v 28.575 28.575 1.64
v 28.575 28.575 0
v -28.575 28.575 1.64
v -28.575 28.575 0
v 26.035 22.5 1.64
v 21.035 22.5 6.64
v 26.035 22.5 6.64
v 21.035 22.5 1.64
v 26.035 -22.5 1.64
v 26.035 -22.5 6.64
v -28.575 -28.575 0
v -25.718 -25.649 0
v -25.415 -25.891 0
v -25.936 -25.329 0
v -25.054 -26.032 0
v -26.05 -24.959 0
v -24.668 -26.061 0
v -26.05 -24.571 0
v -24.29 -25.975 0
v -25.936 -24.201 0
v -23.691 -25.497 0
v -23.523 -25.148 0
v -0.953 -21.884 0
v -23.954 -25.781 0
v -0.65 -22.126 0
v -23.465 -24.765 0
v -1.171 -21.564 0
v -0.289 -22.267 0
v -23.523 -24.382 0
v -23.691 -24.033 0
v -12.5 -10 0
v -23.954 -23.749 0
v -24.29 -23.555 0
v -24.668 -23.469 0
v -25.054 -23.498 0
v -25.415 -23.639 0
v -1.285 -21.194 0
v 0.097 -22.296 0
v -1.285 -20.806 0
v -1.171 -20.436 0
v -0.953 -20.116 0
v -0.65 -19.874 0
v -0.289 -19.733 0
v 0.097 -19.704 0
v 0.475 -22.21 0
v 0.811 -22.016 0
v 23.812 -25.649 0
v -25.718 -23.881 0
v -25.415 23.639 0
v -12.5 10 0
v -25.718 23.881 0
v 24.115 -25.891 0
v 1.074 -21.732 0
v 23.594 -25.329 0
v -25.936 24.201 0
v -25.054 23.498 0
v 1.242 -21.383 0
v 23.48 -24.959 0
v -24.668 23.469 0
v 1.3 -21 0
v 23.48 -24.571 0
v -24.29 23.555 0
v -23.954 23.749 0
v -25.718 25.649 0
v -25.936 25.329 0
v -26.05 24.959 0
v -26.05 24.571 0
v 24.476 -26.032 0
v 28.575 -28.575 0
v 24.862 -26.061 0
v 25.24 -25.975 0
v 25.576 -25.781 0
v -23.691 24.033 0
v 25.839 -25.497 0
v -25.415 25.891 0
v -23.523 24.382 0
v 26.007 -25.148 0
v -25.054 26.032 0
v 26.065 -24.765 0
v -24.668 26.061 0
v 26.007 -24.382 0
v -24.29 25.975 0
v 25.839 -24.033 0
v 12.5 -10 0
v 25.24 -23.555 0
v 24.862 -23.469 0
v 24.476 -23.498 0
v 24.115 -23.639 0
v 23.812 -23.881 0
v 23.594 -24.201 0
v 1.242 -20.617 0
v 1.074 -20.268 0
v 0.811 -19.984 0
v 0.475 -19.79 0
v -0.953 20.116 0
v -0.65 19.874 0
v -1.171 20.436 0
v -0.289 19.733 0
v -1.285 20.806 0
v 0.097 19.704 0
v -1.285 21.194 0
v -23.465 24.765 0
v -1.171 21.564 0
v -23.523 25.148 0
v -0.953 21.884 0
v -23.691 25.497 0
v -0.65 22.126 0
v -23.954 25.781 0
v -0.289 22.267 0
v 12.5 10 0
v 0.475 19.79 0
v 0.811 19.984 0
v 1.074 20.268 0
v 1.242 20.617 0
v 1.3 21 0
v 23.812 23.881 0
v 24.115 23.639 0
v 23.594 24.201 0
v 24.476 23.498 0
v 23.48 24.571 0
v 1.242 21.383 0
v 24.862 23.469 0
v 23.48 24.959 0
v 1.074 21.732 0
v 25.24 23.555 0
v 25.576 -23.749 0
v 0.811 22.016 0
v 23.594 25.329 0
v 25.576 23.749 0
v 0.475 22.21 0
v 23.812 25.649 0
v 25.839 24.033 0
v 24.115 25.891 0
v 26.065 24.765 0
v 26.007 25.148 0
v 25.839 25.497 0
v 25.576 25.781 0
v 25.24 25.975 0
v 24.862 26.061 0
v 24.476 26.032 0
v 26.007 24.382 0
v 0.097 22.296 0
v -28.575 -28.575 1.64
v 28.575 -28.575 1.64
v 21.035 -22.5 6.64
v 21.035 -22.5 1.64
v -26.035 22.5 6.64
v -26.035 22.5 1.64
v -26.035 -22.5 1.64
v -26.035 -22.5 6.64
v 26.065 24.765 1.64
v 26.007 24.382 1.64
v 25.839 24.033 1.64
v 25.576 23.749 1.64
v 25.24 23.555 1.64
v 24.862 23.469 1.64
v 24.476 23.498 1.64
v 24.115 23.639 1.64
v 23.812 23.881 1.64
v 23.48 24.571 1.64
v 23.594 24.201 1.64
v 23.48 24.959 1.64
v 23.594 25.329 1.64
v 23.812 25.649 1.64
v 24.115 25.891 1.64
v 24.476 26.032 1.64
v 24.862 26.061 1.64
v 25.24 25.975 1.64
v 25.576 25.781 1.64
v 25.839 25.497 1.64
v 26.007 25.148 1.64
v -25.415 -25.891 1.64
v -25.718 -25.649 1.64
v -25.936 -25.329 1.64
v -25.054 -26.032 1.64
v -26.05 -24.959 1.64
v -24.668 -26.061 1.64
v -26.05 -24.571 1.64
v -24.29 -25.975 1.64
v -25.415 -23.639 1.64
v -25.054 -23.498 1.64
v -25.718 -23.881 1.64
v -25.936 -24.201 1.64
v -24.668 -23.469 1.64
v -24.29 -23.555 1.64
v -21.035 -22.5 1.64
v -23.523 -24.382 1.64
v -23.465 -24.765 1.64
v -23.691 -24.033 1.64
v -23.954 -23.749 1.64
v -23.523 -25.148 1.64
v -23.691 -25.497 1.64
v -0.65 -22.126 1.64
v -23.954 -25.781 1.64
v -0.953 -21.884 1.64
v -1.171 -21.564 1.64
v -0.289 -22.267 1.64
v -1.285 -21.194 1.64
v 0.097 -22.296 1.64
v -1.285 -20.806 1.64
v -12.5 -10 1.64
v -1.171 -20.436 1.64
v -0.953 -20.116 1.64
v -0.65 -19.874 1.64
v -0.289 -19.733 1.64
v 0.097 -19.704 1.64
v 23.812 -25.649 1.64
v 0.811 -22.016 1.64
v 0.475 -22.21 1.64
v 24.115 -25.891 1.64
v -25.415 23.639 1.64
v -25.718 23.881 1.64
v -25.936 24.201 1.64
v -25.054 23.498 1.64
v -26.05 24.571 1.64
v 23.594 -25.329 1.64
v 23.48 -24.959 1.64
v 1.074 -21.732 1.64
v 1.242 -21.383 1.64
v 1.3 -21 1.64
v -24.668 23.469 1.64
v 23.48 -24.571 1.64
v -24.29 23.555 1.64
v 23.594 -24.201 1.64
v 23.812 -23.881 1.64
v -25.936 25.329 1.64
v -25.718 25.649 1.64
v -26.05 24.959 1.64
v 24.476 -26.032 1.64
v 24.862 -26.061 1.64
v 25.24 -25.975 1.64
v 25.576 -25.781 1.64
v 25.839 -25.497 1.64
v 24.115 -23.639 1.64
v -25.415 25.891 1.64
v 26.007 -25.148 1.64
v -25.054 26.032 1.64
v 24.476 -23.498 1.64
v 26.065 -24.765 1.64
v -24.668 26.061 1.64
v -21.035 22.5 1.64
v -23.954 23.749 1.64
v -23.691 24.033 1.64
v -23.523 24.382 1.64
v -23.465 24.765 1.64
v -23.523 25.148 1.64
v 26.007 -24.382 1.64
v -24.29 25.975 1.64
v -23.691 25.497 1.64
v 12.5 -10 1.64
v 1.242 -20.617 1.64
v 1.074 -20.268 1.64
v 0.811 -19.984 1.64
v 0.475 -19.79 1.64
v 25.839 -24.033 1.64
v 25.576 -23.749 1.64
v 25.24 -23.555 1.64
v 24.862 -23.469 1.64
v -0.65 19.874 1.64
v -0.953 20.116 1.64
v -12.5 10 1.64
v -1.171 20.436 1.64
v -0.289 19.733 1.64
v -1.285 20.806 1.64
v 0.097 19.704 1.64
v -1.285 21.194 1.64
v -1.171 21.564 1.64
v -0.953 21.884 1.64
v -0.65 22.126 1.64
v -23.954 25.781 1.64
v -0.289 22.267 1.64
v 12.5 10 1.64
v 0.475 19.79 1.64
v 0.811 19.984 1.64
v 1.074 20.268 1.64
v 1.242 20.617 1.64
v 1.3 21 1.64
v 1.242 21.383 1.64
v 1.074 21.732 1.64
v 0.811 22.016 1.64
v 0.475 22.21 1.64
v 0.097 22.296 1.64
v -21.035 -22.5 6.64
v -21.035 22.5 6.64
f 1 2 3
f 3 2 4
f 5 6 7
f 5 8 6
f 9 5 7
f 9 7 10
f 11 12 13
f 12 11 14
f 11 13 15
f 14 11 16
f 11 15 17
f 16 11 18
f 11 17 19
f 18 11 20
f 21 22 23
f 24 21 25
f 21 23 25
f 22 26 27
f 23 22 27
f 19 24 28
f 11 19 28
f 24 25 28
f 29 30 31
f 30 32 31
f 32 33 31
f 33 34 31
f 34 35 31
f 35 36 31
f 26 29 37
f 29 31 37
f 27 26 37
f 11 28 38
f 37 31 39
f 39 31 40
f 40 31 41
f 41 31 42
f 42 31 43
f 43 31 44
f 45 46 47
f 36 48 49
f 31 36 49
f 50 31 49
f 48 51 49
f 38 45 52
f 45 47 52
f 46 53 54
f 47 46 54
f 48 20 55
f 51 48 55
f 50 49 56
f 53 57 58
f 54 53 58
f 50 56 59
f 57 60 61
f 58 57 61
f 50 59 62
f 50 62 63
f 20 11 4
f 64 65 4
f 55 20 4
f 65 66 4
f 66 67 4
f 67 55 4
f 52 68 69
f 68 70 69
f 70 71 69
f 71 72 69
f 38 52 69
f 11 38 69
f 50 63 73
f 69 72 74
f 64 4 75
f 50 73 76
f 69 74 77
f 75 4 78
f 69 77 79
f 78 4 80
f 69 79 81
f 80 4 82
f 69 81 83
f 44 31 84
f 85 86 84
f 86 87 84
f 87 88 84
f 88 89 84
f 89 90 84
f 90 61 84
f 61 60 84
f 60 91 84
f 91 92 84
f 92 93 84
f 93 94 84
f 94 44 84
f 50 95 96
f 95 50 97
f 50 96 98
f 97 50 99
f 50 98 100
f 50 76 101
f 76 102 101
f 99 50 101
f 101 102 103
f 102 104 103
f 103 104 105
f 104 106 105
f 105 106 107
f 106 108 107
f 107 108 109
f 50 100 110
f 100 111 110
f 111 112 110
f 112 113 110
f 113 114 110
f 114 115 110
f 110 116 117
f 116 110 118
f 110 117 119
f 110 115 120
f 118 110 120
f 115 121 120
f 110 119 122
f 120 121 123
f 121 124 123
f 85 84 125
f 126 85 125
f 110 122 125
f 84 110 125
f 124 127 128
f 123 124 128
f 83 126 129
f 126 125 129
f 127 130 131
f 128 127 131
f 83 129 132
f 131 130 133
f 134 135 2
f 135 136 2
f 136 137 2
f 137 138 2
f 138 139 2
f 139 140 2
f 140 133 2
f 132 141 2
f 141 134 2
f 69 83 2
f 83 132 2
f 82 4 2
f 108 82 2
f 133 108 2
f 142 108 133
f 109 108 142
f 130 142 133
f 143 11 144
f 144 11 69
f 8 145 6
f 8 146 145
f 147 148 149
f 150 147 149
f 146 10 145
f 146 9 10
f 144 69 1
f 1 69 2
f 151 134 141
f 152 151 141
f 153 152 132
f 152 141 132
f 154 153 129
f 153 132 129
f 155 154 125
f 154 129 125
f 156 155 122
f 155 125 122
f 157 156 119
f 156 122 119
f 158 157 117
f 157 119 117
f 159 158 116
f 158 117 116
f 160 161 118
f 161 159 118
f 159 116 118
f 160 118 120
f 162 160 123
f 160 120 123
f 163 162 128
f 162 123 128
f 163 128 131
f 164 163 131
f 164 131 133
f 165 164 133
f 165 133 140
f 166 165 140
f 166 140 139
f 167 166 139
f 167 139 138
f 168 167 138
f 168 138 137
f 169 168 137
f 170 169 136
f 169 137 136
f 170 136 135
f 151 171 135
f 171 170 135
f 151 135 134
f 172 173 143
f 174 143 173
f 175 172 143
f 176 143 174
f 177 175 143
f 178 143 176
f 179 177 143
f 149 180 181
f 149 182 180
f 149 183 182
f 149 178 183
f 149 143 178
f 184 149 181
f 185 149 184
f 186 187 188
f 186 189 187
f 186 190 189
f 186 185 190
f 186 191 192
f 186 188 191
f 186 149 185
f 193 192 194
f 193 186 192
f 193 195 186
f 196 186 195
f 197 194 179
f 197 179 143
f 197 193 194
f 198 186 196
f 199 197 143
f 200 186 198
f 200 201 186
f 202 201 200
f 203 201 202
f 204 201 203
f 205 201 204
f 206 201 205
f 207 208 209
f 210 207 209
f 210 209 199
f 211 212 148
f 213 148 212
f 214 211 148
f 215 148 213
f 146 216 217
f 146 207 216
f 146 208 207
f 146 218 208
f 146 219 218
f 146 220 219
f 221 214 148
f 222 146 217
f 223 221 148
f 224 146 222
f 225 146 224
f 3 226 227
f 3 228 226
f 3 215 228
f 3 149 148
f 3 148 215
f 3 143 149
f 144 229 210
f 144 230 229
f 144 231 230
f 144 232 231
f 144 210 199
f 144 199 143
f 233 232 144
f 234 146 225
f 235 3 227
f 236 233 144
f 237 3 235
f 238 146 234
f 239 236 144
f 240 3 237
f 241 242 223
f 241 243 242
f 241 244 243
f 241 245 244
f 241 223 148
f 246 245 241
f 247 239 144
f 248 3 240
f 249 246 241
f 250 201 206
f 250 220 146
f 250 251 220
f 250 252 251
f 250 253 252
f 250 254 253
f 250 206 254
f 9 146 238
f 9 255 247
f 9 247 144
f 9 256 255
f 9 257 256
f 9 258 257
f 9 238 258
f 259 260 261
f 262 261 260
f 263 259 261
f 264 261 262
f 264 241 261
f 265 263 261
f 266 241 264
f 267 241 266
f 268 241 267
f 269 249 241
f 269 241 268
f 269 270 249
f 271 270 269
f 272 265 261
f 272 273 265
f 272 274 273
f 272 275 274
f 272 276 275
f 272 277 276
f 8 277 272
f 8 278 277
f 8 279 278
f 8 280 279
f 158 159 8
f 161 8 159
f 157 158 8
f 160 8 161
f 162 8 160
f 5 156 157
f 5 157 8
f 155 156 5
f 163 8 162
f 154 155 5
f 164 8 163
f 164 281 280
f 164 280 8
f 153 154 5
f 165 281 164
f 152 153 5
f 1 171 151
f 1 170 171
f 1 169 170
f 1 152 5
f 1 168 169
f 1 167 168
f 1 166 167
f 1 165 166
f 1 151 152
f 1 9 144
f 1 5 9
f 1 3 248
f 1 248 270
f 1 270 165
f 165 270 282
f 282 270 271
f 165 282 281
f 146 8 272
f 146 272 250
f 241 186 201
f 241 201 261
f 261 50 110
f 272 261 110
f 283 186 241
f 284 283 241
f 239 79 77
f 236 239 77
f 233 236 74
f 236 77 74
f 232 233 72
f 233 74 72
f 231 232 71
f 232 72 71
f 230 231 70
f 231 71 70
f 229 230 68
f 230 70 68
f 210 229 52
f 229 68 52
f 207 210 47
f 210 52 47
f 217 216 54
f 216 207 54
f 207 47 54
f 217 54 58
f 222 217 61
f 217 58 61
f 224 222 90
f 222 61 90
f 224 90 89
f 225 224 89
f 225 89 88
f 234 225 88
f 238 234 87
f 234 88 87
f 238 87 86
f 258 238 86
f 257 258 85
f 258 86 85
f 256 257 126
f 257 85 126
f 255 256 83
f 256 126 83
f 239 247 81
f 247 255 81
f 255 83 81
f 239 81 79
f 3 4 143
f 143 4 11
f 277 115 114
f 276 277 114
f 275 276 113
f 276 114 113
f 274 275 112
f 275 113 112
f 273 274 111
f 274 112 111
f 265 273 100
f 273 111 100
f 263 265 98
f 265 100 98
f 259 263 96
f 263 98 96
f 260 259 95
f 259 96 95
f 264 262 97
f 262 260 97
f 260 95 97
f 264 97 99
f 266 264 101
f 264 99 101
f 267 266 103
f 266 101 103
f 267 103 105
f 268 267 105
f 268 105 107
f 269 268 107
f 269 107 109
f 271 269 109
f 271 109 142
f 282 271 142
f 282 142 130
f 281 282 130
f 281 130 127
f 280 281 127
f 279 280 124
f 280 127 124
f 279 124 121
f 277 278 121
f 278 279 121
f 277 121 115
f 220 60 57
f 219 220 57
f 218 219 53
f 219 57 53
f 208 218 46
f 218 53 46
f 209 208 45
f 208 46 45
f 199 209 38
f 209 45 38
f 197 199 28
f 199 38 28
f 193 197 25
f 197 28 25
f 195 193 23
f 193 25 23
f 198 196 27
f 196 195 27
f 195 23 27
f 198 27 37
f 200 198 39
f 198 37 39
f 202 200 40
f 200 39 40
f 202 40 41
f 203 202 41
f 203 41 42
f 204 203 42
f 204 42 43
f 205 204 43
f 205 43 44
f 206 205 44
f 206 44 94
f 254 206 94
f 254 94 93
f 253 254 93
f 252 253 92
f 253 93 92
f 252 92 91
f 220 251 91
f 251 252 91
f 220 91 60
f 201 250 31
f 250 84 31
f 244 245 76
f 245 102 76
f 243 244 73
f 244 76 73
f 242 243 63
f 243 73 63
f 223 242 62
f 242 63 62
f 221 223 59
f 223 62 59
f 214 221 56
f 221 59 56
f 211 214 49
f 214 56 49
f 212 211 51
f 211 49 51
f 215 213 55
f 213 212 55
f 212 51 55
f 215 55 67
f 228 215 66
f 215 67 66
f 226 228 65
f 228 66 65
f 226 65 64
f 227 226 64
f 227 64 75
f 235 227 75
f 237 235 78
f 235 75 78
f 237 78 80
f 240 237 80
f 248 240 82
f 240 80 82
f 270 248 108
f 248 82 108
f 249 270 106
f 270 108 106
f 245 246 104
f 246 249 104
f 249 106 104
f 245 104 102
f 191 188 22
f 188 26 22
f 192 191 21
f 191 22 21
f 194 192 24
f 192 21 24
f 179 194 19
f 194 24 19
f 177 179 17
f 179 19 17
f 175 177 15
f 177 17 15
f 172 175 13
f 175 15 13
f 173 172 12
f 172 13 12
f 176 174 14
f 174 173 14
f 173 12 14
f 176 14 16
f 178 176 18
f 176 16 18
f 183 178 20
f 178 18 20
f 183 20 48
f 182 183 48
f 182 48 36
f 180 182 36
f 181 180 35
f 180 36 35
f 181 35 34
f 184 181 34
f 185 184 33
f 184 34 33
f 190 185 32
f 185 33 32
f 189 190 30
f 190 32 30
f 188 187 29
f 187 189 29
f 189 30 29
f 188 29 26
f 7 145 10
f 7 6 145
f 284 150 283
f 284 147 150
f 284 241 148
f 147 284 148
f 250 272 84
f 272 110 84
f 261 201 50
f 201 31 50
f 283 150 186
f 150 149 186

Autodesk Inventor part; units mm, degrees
ref_plane "YZ Plane" through (0, 0, 0) normal (1, 0, 0) x (0, 1, 0)
ref_plane "XZ Plane" through (0, 0, 0) normal (0, 1, 0) x (-1, 0, 0)
ref_plane "XY Plane" through (0, 0, 0) normal (0, 0, 1) x (1, 0, 0)
sketch "Sketch1" plane through (0, 0, 0) normal (0, 0, 1) x (1, 0, 0)
  line L0 (-28.575, -28.575) -> (28.575, -28.575)
  line L1 (28.575, -28.575) -> (28.575, 28.575)
  line L2 (28.575, 28.575) -> (-28.575, 28.575)
  line L3 (-28.575, 28.575) -> (-28.575, -28.575)
  line L4 (-28.575, -28.575) -> (28.575, 28.575) construction
  line L5 (28.575, -28.575) -> (-28.575, 28.575) construction
  line L6 (-28.575, 0) -> (28.575, 0) construction
  line L7 (0, 28.575) -> (0, -28.575) construction
  circle A0 centre (-24.765, 24.765) radius 1.3
  circle A1 centre (24.765, 24.765) radius 1.3
  circle A2 centre (-24.765, -24.765) radius 1.3
  circle A3 centre (24.765, -24.765) radius 1.3
  circle A4 centre (0, -21) radius 1.3
  circle A5 centre (0, 21) radius 1.3
  line L8 (-12.5, 10) -> (12.5, 10)
  line L9 (12.5, 10) -> (12.5, -10)
  line L10 (12.5, -10) -> (-12.5, -10)
  line L11 (-12.5, -10) -> (-12.5, 10)
  line L12 (12.5, 10) -> (-12.5, -10) construction
  line L13 (12.5, -10) -> (-12.5, 10) construction
  point P0 (0, 0)
  point P1 (0, 0)
  dimension "d2" = 57.15
  dimension "d4" = 57.15
  dimension "d27" = 2.6
  dimension "d28" = 3.81
  dimension "d29" = 2.6
  dimension "d30" = 42
  dimension "d31" = 25
  dimension "d32" = 20
extrude "Extrusion1" add sketch "Sketch1" along normal blind 1.64
sketch "Sketch4" plane through (0, 0, 1.64) normal (0, 0, 1) x (1, 0, 0)
  line L0 (28.575, -28.575) -> (28.575, 28.575) projected
  line L1 (-28.575, 28.575) -> (-28.575, -28.575) projected
  line L2 (0, 0) -> (0, 45.0767)
  line L3 (21.035, 22.5) -> (26.035, 22.5)
  line L4 (26.035, 22.5) -> (26.035, -22.5)
  line L5 (26.035, -22.5) -> (21.035, -22.5)
  line L6 (21.035, -22.5) -> (21.035, 22.5)
  line L7 (-21.035, 22.5) -> (-26.035, 22.5)
  line L8 (-26.035, 22.5) -> (-26.035, -22.5)
  line L9 (-26.035, -22.5) -> (-21.035, -22.5)
  line L10 (-21.035, -22.5) -> (-21.035, 22.5)
  dimension "d21" = 2.54
  dimension "d22" = 45
  dimension "d23" = 5
  dimension "d24" = 22.5
extrude "Extrusion4" add sketch "Sketch4" along normal blind 5
properties part number "SFE-Host01" material "PCB(1)"
